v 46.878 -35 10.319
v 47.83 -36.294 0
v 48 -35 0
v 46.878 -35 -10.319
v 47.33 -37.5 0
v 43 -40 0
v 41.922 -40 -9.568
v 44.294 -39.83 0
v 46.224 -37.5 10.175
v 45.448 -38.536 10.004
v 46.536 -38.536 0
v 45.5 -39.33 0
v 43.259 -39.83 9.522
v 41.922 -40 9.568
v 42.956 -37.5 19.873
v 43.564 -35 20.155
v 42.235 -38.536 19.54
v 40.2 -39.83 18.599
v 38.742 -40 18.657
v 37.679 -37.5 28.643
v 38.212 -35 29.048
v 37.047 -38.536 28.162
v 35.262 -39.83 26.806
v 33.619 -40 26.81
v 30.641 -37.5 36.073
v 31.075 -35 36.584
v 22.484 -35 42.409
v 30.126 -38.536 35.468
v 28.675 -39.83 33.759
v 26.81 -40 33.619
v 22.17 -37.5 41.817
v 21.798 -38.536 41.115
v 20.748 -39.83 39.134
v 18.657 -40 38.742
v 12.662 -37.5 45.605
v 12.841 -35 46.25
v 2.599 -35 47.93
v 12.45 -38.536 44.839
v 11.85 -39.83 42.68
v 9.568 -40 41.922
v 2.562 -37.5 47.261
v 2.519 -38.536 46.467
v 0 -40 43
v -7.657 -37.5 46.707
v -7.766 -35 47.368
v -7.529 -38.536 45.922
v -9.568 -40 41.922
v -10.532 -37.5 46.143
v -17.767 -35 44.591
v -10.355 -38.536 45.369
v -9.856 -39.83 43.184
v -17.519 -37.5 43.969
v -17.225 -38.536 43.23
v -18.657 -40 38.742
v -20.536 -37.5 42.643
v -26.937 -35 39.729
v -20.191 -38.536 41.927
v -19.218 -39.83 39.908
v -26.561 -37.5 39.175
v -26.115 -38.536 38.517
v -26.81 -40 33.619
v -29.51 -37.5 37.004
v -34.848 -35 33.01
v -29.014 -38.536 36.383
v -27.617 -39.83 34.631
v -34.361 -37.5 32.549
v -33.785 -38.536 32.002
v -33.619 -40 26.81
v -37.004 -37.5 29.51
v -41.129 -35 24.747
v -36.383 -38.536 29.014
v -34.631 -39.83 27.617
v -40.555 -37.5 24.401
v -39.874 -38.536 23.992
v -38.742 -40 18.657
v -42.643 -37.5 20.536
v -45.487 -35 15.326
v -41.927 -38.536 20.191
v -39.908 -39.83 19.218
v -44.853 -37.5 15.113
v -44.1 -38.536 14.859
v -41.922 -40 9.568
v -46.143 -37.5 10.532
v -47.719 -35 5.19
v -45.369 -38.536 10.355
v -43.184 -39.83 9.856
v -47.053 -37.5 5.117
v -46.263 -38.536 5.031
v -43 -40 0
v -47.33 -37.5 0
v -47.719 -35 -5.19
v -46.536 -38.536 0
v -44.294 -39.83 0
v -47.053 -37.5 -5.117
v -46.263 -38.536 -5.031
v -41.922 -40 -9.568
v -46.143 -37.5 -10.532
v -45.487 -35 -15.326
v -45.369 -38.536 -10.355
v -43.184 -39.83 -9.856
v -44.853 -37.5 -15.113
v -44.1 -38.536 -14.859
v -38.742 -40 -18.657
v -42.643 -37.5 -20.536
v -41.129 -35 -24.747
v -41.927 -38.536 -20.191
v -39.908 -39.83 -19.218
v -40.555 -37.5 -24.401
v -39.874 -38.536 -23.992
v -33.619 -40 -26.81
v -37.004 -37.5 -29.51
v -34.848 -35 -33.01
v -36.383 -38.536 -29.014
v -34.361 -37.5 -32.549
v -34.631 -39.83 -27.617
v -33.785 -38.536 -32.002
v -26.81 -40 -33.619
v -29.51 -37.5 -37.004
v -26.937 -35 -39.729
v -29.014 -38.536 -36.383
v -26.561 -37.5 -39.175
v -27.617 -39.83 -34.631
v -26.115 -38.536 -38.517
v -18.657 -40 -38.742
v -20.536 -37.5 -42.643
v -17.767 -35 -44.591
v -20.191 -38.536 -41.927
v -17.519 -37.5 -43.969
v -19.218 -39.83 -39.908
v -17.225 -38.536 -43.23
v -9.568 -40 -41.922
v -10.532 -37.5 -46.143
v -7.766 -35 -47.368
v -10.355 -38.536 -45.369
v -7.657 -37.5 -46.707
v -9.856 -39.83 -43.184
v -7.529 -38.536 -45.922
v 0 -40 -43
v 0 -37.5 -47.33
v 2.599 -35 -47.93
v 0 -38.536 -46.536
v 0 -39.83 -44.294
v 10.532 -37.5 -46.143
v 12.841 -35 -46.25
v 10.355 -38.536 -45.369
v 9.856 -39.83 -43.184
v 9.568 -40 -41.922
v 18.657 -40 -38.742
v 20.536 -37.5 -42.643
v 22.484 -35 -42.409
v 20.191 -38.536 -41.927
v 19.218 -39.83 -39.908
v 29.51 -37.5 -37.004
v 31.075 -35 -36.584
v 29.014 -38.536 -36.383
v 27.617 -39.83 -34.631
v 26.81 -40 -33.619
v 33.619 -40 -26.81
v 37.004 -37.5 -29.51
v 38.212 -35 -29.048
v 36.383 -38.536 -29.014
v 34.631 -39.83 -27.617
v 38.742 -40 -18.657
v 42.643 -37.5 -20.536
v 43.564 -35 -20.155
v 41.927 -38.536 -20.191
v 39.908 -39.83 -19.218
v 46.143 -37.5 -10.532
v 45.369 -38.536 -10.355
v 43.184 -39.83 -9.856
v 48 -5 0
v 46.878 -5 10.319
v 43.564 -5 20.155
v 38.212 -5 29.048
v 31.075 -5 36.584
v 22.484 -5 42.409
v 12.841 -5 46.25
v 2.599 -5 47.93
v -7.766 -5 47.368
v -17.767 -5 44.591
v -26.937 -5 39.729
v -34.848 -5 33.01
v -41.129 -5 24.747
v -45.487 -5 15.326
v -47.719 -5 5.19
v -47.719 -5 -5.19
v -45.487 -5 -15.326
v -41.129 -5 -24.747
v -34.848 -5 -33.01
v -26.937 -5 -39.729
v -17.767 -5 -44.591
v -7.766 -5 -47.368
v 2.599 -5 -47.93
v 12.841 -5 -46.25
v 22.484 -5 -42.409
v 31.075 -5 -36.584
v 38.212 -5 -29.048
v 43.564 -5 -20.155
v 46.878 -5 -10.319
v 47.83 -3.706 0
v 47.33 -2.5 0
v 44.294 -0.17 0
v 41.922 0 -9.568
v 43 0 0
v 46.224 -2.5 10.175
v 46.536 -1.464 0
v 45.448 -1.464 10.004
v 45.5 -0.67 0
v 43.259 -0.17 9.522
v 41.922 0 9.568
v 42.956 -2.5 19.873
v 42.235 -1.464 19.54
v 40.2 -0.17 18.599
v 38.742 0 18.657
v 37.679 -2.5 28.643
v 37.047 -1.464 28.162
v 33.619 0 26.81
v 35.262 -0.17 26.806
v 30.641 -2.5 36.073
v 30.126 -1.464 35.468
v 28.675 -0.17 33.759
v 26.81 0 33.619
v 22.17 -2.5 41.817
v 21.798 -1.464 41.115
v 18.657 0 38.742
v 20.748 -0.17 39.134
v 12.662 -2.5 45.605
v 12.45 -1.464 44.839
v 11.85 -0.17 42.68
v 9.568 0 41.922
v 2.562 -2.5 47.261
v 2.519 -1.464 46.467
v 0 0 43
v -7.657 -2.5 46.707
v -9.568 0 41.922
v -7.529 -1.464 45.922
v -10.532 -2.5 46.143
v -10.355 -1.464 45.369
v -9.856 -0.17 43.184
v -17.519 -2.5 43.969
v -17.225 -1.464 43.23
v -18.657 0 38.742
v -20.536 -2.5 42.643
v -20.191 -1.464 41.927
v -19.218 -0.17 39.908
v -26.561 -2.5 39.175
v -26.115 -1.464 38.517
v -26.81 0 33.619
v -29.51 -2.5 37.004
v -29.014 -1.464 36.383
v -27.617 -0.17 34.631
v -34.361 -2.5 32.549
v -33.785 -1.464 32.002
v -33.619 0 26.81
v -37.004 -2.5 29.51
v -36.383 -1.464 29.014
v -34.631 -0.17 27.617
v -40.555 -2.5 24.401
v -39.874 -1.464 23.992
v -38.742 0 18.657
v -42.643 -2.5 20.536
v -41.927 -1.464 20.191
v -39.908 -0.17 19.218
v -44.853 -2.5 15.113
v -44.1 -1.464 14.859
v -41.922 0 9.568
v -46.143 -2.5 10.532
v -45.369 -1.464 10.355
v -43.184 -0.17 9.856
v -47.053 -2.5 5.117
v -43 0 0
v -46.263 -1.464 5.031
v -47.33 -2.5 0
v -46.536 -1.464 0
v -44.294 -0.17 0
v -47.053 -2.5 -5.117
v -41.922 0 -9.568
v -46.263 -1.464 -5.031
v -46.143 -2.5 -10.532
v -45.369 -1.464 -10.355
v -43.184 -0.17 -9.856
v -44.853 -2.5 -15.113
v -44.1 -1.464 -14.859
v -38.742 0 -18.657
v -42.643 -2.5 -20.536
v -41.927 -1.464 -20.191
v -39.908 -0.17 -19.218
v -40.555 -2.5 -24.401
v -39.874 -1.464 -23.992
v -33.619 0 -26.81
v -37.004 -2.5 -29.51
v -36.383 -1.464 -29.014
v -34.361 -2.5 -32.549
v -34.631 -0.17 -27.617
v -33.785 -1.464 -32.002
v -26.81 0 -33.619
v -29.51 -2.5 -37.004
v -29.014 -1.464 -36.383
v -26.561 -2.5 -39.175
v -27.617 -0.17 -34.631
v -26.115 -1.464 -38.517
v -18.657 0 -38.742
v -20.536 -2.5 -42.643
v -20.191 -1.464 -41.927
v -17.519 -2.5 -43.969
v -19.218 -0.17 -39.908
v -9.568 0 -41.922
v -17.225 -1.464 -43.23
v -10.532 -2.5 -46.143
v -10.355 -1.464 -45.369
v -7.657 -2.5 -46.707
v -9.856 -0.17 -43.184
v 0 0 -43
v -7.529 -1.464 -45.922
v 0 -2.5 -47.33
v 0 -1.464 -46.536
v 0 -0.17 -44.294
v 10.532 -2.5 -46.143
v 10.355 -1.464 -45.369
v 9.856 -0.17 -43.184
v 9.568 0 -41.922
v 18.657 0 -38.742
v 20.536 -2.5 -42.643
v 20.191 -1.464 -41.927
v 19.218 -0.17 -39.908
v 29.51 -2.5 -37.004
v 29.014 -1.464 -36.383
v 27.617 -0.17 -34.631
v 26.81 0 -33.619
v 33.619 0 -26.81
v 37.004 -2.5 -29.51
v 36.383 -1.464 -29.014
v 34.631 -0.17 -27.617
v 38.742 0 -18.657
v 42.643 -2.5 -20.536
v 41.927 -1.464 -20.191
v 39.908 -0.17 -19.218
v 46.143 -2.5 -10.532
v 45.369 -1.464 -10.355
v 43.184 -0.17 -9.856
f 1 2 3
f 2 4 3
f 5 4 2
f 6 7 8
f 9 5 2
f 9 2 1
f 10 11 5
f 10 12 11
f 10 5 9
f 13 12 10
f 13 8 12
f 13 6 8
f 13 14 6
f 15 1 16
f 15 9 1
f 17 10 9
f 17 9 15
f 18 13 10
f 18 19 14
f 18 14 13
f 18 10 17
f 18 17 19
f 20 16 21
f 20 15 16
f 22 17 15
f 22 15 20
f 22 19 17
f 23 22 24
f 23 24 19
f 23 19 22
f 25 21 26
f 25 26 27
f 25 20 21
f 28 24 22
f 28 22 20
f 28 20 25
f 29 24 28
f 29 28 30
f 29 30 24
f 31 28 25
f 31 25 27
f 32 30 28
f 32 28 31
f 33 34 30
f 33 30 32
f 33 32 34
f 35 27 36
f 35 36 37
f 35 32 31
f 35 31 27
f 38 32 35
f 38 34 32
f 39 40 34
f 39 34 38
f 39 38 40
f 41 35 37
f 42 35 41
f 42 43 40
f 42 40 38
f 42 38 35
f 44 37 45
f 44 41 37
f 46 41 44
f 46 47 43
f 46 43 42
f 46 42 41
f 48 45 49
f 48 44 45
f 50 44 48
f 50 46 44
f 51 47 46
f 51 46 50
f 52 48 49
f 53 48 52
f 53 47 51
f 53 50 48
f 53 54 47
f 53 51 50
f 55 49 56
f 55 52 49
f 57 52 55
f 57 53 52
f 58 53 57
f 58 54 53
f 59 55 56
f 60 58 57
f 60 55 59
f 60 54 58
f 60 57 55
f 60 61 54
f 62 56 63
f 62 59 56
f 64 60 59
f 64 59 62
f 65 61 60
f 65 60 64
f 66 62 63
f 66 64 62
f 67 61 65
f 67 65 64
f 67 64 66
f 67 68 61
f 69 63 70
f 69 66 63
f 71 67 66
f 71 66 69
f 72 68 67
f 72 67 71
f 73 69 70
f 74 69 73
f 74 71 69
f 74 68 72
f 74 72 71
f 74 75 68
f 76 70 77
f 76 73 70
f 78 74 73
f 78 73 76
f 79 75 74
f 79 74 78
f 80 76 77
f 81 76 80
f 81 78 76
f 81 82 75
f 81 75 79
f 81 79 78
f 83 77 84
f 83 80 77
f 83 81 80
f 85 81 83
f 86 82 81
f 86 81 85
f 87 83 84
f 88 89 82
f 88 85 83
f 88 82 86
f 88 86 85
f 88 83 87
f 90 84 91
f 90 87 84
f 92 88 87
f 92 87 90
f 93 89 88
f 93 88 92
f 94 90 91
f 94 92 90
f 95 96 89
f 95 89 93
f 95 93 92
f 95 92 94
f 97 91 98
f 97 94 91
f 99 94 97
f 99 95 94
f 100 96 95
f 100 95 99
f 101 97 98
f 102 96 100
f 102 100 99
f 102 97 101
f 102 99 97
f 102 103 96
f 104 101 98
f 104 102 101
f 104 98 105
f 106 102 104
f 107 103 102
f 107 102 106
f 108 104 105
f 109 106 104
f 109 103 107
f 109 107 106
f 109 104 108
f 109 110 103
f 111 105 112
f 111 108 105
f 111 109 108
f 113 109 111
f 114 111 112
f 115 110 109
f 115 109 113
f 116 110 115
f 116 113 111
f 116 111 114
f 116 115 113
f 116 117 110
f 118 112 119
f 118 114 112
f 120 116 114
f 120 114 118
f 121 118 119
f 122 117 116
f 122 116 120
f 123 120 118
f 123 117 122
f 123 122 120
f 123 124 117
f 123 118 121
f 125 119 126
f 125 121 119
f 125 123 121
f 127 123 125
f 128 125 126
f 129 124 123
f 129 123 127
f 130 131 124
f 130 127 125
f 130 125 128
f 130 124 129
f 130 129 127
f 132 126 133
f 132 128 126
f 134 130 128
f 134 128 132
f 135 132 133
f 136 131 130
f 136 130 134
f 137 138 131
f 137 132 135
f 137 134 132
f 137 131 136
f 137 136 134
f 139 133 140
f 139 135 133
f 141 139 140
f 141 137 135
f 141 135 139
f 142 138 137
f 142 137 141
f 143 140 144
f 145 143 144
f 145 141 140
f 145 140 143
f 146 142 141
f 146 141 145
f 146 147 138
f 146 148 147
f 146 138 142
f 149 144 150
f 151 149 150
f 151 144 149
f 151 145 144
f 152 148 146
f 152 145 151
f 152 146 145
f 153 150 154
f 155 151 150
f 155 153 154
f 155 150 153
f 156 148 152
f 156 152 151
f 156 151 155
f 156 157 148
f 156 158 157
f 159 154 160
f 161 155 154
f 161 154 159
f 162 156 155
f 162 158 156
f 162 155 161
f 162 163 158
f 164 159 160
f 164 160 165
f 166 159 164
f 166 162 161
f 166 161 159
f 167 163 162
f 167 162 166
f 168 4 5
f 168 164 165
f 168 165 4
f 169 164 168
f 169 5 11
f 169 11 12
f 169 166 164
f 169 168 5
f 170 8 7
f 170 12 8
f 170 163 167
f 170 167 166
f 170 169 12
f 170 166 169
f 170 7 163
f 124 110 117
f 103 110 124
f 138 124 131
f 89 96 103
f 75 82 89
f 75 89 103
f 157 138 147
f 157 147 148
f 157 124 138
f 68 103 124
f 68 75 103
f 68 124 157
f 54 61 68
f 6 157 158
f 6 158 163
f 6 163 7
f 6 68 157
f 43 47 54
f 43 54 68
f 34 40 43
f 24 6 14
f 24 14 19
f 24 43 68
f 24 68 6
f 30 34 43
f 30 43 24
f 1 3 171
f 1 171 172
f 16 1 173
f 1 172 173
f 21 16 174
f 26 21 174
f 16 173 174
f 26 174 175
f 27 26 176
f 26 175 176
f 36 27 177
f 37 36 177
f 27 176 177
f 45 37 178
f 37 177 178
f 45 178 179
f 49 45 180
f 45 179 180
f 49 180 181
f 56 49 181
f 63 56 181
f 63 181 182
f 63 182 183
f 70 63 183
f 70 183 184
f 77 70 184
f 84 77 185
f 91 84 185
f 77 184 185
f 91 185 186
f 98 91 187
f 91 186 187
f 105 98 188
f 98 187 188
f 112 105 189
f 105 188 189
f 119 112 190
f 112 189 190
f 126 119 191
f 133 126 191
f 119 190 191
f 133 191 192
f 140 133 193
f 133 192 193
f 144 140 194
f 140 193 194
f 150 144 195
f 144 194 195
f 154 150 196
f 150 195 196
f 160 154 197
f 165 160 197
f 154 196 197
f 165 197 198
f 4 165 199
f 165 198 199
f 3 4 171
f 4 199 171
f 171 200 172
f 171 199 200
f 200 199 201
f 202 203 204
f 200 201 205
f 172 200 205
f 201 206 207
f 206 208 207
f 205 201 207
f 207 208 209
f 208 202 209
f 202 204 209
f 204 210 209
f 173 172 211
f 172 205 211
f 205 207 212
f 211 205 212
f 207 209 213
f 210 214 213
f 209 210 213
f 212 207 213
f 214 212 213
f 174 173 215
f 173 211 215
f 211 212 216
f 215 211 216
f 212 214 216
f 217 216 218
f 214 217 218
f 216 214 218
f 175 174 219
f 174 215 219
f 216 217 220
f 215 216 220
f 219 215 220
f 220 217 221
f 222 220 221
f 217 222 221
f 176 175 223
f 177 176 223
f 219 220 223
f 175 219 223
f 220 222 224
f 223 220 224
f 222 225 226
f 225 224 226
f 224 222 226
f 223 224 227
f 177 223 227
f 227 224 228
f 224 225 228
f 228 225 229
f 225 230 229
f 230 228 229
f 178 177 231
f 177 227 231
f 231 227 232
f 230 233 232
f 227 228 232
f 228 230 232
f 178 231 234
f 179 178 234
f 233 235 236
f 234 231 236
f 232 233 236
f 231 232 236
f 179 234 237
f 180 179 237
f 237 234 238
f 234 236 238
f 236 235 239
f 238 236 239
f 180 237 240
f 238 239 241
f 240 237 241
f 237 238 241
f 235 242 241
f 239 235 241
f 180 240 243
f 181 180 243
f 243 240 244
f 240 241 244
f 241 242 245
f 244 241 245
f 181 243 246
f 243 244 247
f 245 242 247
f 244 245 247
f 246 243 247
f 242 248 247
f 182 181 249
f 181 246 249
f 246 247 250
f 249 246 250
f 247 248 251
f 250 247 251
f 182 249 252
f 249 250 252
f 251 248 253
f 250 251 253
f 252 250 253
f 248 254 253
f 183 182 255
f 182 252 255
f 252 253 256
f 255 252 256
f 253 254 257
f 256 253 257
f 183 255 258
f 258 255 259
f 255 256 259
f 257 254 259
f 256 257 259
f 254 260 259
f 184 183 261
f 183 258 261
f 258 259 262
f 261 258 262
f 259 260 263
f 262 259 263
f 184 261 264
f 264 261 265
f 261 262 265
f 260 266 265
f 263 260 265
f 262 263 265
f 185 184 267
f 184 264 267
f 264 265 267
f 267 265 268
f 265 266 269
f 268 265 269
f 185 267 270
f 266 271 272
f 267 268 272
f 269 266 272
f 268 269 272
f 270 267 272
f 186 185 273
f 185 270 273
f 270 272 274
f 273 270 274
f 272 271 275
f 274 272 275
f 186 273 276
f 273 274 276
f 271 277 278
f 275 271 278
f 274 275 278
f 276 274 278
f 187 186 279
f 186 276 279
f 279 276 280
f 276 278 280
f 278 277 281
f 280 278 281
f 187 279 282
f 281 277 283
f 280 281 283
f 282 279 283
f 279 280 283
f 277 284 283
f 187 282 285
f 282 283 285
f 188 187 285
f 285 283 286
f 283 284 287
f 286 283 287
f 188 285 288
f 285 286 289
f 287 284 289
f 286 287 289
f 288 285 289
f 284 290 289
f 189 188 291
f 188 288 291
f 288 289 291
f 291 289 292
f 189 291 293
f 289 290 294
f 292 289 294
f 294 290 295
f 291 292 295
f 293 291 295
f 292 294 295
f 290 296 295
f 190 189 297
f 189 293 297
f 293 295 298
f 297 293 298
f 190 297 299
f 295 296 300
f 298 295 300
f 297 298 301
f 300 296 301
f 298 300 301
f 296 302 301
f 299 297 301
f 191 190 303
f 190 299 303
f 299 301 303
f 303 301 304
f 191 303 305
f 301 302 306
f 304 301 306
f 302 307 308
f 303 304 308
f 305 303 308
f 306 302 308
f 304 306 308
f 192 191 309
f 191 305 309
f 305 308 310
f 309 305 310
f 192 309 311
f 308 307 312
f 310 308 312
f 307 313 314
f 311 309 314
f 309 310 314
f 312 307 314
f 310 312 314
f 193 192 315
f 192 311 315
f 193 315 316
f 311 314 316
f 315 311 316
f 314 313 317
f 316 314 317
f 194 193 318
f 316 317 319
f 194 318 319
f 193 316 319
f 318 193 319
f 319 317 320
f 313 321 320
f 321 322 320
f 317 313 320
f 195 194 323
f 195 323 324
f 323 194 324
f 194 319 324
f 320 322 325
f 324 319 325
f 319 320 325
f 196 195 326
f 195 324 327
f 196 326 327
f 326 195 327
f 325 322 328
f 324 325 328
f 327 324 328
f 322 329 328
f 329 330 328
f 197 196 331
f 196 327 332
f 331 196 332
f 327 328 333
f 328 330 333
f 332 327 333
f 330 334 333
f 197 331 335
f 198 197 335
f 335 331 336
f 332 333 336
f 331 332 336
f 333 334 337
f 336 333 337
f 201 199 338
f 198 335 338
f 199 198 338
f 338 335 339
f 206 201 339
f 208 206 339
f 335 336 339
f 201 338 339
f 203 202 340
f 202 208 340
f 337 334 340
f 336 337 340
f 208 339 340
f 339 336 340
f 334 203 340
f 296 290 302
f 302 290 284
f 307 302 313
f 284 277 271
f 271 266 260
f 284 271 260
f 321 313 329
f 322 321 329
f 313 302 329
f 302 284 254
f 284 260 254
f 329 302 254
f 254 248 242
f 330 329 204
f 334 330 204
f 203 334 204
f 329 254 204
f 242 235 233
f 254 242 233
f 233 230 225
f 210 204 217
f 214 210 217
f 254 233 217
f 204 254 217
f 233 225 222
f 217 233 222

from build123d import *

# Parameters (mm, degrees)
F0_R     = 48
F1_DEPTH = 40
F2_R     = 5
F3_R     = 5


with BuildPart() as f1:
    # F0 (on Front) → F1 (new body)
    with BuildSketch(Plane.XZ):
        Circle(F0_R)
    extrude(amount=F1_DEPTH)

    # F2
    f2_edges = [f1.edges().sort_by_distance(p)[0] for p in [
        (-48, -40, 0),
    ]]
    fillet(f2_edges, radius=F2_R)

    # F3
    f3_edges = [f1.edges().sort_by_distance(p)[0] for p in [
        (48, -17.5, 0),
        (-48, -35, 0),
        (-48, 0, 0),
    ]]
    fillet(f3_edges, radius=F3_R)


solid = f1.part
